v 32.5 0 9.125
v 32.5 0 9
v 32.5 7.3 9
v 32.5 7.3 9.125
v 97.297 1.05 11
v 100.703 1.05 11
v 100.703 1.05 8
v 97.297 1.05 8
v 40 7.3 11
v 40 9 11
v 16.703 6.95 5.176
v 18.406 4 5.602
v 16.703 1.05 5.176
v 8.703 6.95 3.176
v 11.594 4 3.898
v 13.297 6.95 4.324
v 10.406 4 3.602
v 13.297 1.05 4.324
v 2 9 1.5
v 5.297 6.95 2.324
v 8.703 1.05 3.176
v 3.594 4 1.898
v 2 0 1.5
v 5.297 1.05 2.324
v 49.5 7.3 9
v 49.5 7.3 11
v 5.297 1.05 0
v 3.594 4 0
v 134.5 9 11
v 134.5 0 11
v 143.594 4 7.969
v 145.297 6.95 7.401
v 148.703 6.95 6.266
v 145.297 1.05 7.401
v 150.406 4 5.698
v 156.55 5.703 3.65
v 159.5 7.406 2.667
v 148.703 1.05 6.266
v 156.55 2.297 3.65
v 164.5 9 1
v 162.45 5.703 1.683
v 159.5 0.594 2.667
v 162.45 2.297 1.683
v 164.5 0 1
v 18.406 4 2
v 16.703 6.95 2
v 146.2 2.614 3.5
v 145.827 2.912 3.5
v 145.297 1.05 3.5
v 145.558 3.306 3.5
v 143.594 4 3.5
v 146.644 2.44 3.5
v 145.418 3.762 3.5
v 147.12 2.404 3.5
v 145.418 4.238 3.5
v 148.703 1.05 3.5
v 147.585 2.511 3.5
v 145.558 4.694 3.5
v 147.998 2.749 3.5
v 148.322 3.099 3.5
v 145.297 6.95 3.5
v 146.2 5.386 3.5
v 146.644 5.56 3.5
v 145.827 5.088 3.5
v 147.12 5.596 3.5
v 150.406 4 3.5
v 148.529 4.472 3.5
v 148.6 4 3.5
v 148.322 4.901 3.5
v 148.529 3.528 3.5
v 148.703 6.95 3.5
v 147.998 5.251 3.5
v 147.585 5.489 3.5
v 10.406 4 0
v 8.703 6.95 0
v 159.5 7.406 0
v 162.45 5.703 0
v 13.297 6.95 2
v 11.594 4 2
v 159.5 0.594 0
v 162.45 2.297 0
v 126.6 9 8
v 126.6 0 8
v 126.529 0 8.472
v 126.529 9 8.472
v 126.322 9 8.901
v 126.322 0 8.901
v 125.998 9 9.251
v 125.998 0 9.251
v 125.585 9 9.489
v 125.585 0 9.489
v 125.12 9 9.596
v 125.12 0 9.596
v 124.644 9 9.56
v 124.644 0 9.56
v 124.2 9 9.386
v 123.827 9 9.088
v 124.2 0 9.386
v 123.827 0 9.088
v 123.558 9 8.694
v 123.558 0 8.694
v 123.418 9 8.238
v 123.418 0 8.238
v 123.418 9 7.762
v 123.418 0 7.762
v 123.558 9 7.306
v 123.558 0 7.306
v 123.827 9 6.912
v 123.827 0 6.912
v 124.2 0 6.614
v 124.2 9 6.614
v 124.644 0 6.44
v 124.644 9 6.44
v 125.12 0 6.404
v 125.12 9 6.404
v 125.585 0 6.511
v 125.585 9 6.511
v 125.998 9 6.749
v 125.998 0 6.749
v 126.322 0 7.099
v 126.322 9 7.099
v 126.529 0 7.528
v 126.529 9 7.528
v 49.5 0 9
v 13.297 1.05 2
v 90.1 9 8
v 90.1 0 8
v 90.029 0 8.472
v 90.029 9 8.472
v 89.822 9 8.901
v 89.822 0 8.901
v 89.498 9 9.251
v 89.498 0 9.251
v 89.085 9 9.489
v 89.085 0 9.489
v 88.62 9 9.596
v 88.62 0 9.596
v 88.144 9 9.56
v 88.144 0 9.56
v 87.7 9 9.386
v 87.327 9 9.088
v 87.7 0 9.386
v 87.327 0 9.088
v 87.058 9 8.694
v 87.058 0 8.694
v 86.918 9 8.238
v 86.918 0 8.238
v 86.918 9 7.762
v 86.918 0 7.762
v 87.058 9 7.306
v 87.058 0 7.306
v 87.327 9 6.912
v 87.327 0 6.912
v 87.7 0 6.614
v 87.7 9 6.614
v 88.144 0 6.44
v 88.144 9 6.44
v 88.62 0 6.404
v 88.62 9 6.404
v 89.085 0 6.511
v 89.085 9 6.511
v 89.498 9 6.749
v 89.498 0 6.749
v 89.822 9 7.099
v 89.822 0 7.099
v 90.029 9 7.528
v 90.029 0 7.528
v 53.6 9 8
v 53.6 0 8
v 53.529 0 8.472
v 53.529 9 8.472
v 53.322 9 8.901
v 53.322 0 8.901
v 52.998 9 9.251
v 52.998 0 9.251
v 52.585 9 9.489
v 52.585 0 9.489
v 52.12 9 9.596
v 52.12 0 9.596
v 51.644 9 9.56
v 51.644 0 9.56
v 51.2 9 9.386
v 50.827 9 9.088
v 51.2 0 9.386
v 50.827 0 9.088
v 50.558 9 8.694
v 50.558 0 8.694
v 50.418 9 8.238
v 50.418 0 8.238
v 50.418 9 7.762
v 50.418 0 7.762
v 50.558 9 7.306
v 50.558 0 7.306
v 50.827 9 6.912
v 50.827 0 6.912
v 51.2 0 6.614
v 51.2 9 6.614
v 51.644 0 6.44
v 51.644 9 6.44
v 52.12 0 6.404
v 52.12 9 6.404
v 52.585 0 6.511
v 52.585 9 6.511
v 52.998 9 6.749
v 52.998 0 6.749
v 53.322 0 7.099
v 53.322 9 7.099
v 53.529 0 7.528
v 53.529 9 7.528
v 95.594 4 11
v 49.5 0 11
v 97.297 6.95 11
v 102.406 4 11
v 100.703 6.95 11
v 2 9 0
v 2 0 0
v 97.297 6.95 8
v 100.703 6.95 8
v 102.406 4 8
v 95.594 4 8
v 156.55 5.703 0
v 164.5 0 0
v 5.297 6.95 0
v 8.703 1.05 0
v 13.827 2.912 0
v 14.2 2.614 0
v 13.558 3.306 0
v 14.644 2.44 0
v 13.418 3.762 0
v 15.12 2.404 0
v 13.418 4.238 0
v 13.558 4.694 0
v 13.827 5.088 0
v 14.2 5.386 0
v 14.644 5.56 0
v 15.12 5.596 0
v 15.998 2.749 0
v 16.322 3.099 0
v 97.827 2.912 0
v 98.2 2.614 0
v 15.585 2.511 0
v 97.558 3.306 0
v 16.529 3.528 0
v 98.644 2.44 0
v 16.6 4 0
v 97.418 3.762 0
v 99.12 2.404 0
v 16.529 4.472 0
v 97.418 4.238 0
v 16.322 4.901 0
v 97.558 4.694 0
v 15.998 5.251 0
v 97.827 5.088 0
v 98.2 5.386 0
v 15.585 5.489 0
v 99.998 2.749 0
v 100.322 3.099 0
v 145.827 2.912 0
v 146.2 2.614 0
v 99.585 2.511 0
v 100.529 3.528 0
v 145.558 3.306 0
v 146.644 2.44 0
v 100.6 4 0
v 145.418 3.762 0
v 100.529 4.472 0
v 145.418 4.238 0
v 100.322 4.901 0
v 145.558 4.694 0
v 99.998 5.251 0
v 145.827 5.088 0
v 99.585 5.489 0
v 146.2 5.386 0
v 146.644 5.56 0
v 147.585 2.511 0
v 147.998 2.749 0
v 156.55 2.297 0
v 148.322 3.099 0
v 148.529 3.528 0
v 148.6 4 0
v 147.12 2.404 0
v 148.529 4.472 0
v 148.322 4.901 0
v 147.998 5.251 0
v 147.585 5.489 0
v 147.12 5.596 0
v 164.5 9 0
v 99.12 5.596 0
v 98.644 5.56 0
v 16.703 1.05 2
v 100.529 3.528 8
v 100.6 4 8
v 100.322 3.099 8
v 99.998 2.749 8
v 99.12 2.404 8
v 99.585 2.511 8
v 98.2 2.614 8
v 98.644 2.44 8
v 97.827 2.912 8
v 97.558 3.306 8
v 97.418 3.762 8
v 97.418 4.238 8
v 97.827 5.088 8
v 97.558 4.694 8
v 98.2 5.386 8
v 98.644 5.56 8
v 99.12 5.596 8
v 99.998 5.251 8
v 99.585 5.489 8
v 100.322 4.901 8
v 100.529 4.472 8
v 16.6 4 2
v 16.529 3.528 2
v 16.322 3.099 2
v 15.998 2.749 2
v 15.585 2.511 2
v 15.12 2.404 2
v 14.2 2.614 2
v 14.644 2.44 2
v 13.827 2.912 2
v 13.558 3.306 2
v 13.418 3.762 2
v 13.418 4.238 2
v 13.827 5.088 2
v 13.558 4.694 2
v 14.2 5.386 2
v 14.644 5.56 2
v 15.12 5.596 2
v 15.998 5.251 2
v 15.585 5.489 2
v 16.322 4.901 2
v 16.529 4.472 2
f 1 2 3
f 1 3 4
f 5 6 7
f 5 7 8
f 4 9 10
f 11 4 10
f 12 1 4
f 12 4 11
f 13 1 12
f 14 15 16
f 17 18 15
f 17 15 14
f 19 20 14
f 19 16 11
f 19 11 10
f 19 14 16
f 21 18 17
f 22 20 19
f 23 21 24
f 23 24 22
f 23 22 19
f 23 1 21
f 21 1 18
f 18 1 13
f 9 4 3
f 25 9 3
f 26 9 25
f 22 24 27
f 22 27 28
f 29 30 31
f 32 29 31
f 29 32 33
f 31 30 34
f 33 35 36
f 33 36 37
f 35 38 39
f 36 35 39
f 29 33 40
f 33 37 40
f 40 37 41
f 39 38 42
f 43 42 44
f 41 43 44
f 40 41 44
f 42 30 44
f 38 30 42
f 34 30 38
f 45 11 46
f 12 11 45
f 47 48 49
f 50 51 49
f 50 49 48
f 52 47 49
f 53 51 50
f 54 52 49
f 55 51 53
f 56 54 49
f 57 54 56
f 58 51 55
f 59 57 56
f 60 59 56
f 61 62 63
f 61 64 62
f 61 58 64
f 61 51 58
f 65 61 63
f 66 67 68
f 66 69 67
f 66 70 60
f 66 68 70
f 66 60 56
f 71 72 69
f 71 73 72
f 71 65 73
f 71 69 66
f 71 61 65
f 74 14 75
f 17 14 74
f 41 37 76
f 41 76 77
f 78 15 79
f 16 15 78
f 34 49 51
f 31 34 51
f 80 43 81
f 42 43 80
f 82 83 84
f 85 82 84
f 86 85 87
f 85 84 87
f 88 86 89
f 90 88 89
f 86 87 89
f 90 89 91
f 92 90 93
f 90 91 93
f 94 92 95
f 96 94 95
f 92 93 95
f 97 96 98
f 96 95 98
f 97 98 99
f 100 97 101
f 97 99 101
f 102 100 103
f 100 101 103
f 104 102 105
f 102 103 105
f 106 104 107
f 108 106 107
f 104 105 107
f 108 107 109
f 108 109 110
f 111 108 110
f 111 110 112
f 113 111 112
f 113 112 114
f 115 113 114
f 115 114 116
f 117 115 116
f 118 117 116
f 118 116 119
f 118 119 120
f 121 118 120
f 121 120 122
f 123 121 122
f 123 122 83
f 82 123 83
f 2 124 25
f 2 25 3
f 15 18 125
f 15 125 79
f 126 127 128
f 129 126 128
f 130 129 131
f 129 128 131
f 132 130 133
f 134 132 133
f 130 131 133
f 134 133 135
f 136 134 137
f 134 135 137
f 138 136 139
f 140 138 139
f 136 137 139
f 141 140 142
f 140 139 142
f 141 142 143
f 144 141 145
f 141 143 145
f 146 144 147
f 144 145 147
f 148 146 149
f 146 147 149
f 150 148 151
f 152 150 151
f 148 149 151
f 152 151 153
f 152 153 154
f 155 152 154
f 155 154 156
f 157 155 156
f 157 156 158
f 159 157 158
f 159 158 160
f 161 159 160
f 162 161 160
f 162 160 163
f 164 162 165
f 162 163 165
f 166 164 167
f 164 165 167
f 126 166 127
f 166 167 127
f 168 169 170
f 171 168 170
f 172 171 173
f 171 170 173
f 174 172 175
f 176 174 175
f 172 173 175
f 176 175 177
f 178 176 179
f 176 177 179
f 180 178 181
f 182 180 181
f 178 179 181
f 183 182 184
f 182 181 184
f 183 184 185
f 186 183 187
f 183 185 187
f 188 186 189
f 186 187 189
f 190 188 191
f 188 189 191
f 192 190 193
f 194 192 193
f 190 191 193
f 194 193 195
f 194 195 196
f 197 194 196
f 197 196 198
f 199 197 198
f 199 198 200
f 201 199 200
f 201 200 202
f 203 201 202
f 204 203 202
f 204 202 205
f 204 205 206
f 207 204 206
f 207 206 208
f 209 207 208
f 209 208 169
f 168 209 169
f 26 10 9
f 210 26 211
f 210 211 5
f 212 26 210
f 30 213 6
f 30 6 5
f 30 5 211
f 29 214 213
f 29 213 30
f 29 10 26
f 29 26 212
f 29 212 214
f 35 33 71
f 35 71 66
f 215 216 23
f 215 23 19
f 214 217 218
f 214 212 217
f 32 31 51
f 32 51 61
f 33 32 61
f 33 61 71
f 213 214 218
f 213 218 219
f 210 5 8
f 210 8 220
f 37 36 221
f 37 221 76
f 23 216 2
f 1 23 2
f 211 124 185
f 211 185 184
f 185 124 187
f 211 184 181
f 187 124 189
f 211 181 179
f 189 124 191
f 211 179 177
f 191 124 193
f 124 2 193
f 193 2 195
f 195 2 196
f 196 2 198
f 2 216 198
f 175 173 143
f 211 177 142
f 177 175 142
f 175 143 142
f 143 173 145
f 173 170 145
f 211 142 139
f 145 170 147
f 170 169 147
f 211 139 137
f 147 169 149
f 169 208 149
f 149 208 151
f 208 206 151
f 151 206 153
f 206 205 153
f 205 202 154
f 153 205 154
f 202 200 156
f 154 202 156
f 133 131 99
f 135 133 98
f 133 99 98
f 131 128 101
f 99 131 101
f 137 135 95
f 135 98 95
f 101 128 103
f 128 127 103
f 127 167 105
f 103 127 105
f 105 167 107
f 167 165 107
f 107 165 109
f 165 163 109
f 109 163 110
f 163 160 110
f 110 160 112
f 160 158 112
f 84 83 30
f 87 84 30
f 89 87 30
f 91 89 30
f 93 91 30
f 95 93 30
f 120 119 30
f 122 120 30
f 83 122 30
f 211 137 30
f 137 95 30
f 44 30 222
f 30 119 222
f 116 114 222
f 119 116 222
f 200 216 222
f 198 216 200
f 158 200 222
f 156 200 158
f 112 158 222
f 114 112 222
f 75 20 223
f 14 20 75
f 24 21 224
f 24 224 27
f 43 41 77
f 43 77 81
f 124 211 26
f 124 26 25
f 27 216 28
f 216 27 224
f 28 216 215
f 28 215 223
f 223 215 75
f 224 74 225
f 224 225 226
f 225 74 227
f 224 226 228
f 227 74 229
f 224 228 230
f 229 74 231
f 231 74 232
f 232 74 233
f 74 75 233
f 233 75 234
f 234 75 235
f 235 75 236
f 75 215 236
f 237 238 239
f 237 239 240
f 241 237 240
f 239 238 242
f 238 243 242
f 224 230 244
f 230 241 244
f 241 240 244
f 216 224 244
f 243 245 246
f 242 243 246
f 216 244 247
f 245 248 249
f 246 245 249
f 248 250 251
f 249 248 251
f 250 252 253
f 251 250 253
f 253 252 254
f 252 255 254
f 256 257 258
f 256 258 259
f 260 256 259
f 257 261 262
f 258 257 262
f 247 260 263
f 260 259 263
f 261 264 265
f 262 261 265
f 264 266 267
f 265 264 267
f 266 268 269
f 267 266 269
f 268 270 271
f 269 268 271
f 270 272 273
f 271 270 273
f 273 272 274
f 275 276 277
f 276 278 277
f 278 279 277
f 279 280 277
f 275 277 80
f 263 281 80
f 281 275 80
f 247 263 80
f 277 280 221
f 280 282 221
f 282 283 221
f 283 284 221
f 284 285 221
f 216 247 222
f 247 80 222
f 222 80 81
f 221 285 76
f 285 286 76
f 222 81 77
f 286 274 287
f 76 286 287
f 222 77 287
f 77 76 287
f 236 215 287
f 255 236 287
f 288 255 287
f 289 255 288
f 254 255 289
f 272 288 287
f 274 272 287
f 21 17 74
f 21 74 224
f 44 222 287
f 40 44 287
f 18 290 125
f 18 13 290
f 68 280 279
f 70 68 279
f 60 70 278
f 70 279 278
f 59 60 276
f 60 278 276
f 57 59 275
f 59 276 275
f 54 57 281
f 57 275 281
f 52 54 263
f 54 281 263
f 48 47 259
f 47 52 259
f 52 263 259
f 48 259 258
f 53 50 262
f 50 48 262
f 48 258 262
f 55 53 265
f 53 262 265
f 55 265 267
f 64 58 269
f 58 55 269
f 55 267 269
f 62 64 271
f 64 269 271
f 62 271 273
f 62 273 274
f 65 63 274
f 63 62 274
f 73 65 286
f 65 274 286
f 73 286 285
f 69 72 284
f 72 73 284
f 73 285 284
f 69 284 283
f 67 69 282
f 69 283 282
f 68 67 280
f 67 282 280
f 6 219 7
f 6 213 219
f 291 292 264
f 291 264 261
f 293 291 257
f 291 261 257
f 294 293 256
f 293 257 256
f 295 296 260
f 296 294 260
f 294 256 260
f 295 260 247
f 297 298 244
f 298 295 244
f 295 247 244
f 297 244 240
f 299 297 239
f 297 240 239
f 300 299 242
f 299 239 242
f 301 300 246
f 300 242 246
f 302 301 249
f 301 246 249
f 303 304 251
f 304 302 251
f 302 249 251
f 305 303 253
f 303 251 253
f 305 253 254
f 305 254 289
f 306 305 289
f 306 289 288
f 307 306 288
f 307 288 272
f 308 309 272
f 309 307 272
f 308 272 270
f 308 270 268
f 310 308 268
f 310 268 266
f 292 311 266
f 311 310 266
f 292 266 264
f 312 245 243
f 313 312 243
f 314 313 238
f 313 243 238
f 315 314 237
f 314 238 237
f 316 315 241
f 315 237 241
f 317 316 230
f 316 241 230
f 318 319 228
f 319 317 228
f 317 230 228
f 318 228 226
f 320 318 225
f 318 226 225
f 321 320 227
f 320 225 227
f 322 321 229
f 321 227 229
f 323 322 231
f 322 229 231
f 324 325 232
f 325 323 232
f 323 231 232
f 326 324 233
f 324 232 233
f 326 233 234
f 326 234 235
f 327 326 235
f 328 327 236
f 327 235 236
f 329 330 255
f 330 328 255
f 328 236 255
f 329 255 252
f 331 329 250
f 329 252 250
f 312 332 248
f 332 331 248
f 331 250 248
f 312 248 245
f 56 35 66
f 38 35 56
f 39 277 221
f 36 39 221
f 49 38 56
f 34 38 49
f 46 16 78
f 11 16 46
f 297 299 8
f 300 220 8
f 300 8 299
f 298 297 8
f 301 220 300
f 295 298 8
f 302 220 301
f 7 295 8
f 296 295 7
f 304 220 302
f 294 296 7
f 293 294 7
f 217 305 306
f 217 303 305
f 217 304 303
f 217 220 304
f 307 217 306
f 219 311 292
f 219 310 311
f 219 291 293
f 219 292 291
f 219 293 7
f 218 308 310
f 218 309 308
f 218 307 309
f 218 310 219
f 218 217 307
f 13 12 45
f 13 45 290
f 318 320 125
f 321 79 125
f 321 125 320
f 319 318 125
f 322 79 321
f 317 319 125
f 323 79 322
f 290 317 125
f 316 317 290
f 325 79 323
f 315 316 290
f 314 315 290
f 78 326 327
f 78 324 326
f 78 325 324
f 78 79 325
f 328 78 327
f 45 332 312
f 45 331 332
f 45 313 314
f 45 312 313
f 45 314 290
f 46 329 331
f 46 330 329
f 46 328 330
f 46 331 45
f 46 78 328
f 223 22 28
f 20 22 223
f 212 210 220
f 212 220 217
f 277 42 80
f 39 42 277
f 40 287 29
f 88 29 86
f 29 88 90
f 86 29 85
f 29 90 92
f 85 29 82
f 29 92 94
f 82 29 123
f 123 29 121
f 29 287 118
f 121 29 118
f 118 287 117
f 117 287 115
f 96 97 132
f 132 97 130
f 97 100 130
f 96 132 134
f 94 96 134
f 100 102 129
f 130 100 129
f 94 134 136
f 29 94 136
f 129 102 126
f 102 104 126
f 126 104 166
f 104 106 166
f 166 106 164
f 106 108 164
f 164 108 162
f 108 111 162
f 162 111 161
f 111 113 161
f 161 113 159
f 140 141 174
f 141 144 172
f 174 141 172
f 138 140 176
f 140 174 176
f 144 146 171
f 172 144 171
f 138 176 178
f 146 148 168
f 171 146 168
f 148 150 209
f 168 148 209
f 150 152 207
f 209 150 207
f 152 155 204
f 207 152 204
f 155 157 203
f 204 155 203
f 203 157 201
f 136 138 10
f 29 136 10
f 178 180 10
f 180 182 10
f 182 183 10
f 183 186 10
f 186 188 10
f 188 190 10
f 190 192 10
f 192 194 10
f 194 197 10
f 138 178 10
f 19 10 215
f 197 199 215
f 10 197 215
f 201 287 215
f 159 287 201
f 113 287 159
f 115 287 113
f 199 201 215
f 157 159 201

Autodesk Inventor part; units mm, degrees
ref_plane "YZ Plane" through (0, 0, 0) normal (1, 0, 0) x (0, 1, 0)
ref_plane "XZ Plane" through (0, 0, 0) normal (0, 1, 0) x (-1, 0, 0)
ref_plane "XY Plane" through (0, 0, 0) normal (0, 0, 1) x (1, 0, 0)
sketch "Sketch1" plane through (0, 0, 0) normal (0, 0, 1) x (1, 0, 0)
  line L0 (0, 0) -> (164.5, 0)
  line L1 (164.5, 0) -> (164.5, 9)
  line L2 (164.5, 9) -> (0, 9)
  line L3 (0, 9) -> (0, 0)
  circle A0 centre (99, 4) radius 1.6
  circle A1 centre (159.5, 4) radius 1.6
  circle A2 centre (147, 4) radius 1.6
  circle A3 centre (15, 4) radius 1.6
  circle A4 centre (7, 4) radius 1.6
  dimension "d1" = 9
  dimension "d2" = 90
  dimension "d6" = 3.2
  dimension "d7" = 3.2
  dimension "d9" = 60.5
  dimension "d26" = 3.2
  dimension "d27" = 48
  dimension "d28" = 3.2
  dimension "d32" = 15
  dimension "d33" = 5
  dimension "d61" = 3.2
  dimension "d62" = 8
  dimension "d63" = 12.5
  dimension "d108" = 4
  dimension "d109" = 4
  dimension "d111" = 4
  dimension "d112" = 4
  dimension "d113" = 4
ref_plane "Work Plane2" through (0, 0, 0) normal (0, -1, 0) x (1, 0, 0)
sketch "Sketch2" plane through (0, 0, 0) normal (0, -1, 0) x (1, 0, 0)
  circle A0 centre (52, 8) radius 1.6
  circle A1 centre (125, 8) radius 1.6
  circle A2 centre (88.5, 8) radius 1.6
  point P0 (0, 0)
  point P1 (52, 0)
  dimension "d13" = 3.2
  dimension "d15" = 3.2
  dimension "d17" = 3.2
  dimension "d18" = 36.5
  dimension "d64" = 52
  dimension "d65" = 36.5
  dimension "d114" = 8
  dimension "d115" = 73
ref_plane "Work Plane1" through (0, 0, 11) normal (0, 0, 1) x (1, 0, 0)
extrude "klocek" add sketch "Sketch1" along normal blind 11
ref_plane "Work Plane3" through (0, 0, 0) normal (0, -1, 0) x (1, 0, 0)
extrude "prowadzenie osi" cut sketch "Sketch2" against normal up to next
ref_plane "Work Plane4" through (0, 0, 0) normal (0, -1, 0) x (1, 0, 0)
sketch "Sketch7" plane through (0, 0, 0) normal (0, -1, 0) x (1, 0, 0)
  line L0 (0, 11) -> (0, 1)
  line L1 (0, 11) -> (164.5, 11) projected
  line L2 (0, 11) -> (40, 11)
  line L3 (40, 11) -> (0, 1)
  point P0 (0, -1.8333)
  dimension "d86" = 10
  dimension "d87" = 40
sketch "Sketch8" plane through (0, 0, 0) normal (0, -1, 0) x (1, 0, 0)
  line L0 (164.5, 0) -> (164.5, 11) projected
  line L1 (164.5, 11) -> (164.5, 1)
  line L2 (164.5, 11) -> (0, 11) projected
  line L3 (164.5, 11) -> (134.5, 11)
  line L4 (134.5, 11) -> (164.5, 1)
  point P0 (0, 0)
  point P1 (40.8333, 11)
  dimension "d80" = 10
  dimension "d81" = 30
extrude "przedni skos" cut sketch "Sketch7" against normal up to next
extrude "tylni skos" cut sketch "Sketch8" against normal up to next
ref_plane "Work Plane7" through (0, 0, 11) normal (0, 0, 1) x (1, 0, 0)
sketch "Sketch5" plane through (0, 0, 11) normal (0, 0, 1) x (1, 0, 0)
  circle A0 centre (99, 4) radius 1.6 projected
  line L0 (95.5936, 4) -> (97.2968, 6.95)
  line L1 (97.2968, 6.95) -> (100.7032, 6.95)
  line L2 (100.7032, 6.95) -> (102.4064, 4)
  line L3 (102.4064, 4) -> (100.7032, 1.05)
  line L4 (100.7032, 1.05) -> (97.2968, 1.05)
  line L5 (97.2968, 1.05) -> (95.5936, 4)
  point P0 (119.5, 5)
  dimension "d98" = 5.9
extrude "hex insert middle" cut sketch "Sketch5" against normal blind 3
ref_plane "Work Plane6" through (0, 0, 11) normal (0, 0, 1) x (1, 0, 0)
sketch "Sketch9" plane through (0, 0, 11) normal (0, 0, 1) x (1, 0, 0)
  circle A0 centre (147, 4) radius 1.6 projected
  line L0 (150.4064, 4) -> (148.7032, 1.05)
  line L1 (148.7032, 1.05) -> (145.2968, 1.05)
  line L2 (145.2968, 1.05) -> (143.5936, 4)
  line L3 (143.5936, 4) -> (145.2968, 6.95)
  line L4 (145.2968, 6.95) -> (148.7032, 6.95)
  line L5 (148.7032, 6.95) -> (150.4064, 4)
  point P0 (0, 0)
  point P1 (153, 5)
  dimension "d99" = 5.9
extrude "hex insert rear 1" cut sketch "Sketch9" against normal blind 7.5
ref_plane "Work Plane5" through (0, 0, 11) normal (0, 0, 1) x (1, 0, 0)
sketch "Sketch10" plane through (0, 0, 11) normal (0, 0, 1) x (1, 0, 0)
  circle A0 centre (159.5, 4) radius 1.6 projected
  line L0 (162.45, 5.7032) -> (162.45, 2.2968)
  line L1 (162.45, 2.2968) -> (159.5, 0.5936)
  line L2 (159.5, 0.5936) -> (156.55, 2.2968)
  line L3 (156.55, 2.2968) -> (156.55, 5.7032)
  line L4 (156.55, 5.7032) -> (159.5, 7.4064)
  line L5 (159.5, 7.4064) -> (162.45, 5.7032)
  line L6 (164.5, 0) -> (134.5, 0) projected
  point P0 (0, 0)
  dimension "d118" = 5.9
extrude "hex insert rear 2" cut sketch "Sketch10" against normal up to next contours A0 | L0 L1 L2 L3 L4 L5
sketch "Sketch13" plane through (0, 0, 11) normal (0, 0, 1) x (1, 0, 0)
  circle A0 centre (7, 4) radius 1.6 projected
  line L0 (10.4064, 4) -> (8.7032, 1.05)
  line L1 (8.7032, 1.05) -> (5.2968, 1.05)
  line L2 (5.2968, 1.05) -> (3.5936, 4)
  line L3 (3.5936, 4) -> (5.2968, 6.95)
  line L4 (5.2968, 6.95) -> (8.7032, 6.95)
  line L5 (8.7032, 6.95) -> (10.4064, 4)
  dimension "d123" = 5.9
extrude "hex insert front 1" cut sketch "Sketch13" against normal through all
sketch "Sketch16" plane through (0, 0, 11) normal (0, 0, 1) x (1, 0, 0)
  circle A0 centre (15, 4) radius 1.6 projected
  line L0 (18.4064, 4) -> (16.7032, 1.05)
  line L1 (16.7032, 1.05) -> (13.2968, 1.05)
  line L2 (13.2968, 1.05) -> (11.5936, 4)
  line L3 (11.5936, 4) -> (13.2968, 6.95)
  line L4 (13.2968, 6.95) -> (16.7032, 6.95)
  line L5 (16.7032, 6.95) -> (18.4064, 4)
  point P0 (0, 0)
  dimension "d93" = 5.9
extrude "hex insert front 2" cut sketch "Sketch16" against normal blind 9
sketch "Sketch17" plane through (0, 0, 0) normal (0, 0, -1) x (-1, 0, 0)
  line L0 (-164.5, 9) -> (0, 9) projected
  line L1 (0, 0) -> (-2, 0)
  line L2 (-2, 0) -> (-2, 9)
  line L3 (-2, 9) -> (0, 9)
  line L4 (0, 9) -> (0, 0)
  dimension "d122" = 2
extrude "ciecie przod" cut sketch "Sketch17" against normal up to next
sketch "Sketch18" plane through (40, 0, 11) normal (0, -1, 0) x (1, 0, 0)
  line L0 (9.5, 0) -> (9.5, -2)
  line L1 (9.5, -2) -> (-7.5, -2)
  line L2 (-7.5, -2) -> (-7.5, 0)
  line L3 (-7.5, 0) -> (9.5, 0)
  line L4 (94.5, 0) -> (0, 0) projected
  circle A0 centre (12, -3) radius 1.6 projected
  line L5 (-40, -11) -> (124.5, -11) projected
  point P0 (-35, -11)
  dimension "d102" = 2
  dimension "d103" = 17
  dimension "d104" = 2.5
extrude "sensor linii" cut sketch "Sketch18" against normal blind 7.3 contours L0 L1 L2 L3
properties part number "wheel_support_v5_left_narrow_with_line_sensor"
